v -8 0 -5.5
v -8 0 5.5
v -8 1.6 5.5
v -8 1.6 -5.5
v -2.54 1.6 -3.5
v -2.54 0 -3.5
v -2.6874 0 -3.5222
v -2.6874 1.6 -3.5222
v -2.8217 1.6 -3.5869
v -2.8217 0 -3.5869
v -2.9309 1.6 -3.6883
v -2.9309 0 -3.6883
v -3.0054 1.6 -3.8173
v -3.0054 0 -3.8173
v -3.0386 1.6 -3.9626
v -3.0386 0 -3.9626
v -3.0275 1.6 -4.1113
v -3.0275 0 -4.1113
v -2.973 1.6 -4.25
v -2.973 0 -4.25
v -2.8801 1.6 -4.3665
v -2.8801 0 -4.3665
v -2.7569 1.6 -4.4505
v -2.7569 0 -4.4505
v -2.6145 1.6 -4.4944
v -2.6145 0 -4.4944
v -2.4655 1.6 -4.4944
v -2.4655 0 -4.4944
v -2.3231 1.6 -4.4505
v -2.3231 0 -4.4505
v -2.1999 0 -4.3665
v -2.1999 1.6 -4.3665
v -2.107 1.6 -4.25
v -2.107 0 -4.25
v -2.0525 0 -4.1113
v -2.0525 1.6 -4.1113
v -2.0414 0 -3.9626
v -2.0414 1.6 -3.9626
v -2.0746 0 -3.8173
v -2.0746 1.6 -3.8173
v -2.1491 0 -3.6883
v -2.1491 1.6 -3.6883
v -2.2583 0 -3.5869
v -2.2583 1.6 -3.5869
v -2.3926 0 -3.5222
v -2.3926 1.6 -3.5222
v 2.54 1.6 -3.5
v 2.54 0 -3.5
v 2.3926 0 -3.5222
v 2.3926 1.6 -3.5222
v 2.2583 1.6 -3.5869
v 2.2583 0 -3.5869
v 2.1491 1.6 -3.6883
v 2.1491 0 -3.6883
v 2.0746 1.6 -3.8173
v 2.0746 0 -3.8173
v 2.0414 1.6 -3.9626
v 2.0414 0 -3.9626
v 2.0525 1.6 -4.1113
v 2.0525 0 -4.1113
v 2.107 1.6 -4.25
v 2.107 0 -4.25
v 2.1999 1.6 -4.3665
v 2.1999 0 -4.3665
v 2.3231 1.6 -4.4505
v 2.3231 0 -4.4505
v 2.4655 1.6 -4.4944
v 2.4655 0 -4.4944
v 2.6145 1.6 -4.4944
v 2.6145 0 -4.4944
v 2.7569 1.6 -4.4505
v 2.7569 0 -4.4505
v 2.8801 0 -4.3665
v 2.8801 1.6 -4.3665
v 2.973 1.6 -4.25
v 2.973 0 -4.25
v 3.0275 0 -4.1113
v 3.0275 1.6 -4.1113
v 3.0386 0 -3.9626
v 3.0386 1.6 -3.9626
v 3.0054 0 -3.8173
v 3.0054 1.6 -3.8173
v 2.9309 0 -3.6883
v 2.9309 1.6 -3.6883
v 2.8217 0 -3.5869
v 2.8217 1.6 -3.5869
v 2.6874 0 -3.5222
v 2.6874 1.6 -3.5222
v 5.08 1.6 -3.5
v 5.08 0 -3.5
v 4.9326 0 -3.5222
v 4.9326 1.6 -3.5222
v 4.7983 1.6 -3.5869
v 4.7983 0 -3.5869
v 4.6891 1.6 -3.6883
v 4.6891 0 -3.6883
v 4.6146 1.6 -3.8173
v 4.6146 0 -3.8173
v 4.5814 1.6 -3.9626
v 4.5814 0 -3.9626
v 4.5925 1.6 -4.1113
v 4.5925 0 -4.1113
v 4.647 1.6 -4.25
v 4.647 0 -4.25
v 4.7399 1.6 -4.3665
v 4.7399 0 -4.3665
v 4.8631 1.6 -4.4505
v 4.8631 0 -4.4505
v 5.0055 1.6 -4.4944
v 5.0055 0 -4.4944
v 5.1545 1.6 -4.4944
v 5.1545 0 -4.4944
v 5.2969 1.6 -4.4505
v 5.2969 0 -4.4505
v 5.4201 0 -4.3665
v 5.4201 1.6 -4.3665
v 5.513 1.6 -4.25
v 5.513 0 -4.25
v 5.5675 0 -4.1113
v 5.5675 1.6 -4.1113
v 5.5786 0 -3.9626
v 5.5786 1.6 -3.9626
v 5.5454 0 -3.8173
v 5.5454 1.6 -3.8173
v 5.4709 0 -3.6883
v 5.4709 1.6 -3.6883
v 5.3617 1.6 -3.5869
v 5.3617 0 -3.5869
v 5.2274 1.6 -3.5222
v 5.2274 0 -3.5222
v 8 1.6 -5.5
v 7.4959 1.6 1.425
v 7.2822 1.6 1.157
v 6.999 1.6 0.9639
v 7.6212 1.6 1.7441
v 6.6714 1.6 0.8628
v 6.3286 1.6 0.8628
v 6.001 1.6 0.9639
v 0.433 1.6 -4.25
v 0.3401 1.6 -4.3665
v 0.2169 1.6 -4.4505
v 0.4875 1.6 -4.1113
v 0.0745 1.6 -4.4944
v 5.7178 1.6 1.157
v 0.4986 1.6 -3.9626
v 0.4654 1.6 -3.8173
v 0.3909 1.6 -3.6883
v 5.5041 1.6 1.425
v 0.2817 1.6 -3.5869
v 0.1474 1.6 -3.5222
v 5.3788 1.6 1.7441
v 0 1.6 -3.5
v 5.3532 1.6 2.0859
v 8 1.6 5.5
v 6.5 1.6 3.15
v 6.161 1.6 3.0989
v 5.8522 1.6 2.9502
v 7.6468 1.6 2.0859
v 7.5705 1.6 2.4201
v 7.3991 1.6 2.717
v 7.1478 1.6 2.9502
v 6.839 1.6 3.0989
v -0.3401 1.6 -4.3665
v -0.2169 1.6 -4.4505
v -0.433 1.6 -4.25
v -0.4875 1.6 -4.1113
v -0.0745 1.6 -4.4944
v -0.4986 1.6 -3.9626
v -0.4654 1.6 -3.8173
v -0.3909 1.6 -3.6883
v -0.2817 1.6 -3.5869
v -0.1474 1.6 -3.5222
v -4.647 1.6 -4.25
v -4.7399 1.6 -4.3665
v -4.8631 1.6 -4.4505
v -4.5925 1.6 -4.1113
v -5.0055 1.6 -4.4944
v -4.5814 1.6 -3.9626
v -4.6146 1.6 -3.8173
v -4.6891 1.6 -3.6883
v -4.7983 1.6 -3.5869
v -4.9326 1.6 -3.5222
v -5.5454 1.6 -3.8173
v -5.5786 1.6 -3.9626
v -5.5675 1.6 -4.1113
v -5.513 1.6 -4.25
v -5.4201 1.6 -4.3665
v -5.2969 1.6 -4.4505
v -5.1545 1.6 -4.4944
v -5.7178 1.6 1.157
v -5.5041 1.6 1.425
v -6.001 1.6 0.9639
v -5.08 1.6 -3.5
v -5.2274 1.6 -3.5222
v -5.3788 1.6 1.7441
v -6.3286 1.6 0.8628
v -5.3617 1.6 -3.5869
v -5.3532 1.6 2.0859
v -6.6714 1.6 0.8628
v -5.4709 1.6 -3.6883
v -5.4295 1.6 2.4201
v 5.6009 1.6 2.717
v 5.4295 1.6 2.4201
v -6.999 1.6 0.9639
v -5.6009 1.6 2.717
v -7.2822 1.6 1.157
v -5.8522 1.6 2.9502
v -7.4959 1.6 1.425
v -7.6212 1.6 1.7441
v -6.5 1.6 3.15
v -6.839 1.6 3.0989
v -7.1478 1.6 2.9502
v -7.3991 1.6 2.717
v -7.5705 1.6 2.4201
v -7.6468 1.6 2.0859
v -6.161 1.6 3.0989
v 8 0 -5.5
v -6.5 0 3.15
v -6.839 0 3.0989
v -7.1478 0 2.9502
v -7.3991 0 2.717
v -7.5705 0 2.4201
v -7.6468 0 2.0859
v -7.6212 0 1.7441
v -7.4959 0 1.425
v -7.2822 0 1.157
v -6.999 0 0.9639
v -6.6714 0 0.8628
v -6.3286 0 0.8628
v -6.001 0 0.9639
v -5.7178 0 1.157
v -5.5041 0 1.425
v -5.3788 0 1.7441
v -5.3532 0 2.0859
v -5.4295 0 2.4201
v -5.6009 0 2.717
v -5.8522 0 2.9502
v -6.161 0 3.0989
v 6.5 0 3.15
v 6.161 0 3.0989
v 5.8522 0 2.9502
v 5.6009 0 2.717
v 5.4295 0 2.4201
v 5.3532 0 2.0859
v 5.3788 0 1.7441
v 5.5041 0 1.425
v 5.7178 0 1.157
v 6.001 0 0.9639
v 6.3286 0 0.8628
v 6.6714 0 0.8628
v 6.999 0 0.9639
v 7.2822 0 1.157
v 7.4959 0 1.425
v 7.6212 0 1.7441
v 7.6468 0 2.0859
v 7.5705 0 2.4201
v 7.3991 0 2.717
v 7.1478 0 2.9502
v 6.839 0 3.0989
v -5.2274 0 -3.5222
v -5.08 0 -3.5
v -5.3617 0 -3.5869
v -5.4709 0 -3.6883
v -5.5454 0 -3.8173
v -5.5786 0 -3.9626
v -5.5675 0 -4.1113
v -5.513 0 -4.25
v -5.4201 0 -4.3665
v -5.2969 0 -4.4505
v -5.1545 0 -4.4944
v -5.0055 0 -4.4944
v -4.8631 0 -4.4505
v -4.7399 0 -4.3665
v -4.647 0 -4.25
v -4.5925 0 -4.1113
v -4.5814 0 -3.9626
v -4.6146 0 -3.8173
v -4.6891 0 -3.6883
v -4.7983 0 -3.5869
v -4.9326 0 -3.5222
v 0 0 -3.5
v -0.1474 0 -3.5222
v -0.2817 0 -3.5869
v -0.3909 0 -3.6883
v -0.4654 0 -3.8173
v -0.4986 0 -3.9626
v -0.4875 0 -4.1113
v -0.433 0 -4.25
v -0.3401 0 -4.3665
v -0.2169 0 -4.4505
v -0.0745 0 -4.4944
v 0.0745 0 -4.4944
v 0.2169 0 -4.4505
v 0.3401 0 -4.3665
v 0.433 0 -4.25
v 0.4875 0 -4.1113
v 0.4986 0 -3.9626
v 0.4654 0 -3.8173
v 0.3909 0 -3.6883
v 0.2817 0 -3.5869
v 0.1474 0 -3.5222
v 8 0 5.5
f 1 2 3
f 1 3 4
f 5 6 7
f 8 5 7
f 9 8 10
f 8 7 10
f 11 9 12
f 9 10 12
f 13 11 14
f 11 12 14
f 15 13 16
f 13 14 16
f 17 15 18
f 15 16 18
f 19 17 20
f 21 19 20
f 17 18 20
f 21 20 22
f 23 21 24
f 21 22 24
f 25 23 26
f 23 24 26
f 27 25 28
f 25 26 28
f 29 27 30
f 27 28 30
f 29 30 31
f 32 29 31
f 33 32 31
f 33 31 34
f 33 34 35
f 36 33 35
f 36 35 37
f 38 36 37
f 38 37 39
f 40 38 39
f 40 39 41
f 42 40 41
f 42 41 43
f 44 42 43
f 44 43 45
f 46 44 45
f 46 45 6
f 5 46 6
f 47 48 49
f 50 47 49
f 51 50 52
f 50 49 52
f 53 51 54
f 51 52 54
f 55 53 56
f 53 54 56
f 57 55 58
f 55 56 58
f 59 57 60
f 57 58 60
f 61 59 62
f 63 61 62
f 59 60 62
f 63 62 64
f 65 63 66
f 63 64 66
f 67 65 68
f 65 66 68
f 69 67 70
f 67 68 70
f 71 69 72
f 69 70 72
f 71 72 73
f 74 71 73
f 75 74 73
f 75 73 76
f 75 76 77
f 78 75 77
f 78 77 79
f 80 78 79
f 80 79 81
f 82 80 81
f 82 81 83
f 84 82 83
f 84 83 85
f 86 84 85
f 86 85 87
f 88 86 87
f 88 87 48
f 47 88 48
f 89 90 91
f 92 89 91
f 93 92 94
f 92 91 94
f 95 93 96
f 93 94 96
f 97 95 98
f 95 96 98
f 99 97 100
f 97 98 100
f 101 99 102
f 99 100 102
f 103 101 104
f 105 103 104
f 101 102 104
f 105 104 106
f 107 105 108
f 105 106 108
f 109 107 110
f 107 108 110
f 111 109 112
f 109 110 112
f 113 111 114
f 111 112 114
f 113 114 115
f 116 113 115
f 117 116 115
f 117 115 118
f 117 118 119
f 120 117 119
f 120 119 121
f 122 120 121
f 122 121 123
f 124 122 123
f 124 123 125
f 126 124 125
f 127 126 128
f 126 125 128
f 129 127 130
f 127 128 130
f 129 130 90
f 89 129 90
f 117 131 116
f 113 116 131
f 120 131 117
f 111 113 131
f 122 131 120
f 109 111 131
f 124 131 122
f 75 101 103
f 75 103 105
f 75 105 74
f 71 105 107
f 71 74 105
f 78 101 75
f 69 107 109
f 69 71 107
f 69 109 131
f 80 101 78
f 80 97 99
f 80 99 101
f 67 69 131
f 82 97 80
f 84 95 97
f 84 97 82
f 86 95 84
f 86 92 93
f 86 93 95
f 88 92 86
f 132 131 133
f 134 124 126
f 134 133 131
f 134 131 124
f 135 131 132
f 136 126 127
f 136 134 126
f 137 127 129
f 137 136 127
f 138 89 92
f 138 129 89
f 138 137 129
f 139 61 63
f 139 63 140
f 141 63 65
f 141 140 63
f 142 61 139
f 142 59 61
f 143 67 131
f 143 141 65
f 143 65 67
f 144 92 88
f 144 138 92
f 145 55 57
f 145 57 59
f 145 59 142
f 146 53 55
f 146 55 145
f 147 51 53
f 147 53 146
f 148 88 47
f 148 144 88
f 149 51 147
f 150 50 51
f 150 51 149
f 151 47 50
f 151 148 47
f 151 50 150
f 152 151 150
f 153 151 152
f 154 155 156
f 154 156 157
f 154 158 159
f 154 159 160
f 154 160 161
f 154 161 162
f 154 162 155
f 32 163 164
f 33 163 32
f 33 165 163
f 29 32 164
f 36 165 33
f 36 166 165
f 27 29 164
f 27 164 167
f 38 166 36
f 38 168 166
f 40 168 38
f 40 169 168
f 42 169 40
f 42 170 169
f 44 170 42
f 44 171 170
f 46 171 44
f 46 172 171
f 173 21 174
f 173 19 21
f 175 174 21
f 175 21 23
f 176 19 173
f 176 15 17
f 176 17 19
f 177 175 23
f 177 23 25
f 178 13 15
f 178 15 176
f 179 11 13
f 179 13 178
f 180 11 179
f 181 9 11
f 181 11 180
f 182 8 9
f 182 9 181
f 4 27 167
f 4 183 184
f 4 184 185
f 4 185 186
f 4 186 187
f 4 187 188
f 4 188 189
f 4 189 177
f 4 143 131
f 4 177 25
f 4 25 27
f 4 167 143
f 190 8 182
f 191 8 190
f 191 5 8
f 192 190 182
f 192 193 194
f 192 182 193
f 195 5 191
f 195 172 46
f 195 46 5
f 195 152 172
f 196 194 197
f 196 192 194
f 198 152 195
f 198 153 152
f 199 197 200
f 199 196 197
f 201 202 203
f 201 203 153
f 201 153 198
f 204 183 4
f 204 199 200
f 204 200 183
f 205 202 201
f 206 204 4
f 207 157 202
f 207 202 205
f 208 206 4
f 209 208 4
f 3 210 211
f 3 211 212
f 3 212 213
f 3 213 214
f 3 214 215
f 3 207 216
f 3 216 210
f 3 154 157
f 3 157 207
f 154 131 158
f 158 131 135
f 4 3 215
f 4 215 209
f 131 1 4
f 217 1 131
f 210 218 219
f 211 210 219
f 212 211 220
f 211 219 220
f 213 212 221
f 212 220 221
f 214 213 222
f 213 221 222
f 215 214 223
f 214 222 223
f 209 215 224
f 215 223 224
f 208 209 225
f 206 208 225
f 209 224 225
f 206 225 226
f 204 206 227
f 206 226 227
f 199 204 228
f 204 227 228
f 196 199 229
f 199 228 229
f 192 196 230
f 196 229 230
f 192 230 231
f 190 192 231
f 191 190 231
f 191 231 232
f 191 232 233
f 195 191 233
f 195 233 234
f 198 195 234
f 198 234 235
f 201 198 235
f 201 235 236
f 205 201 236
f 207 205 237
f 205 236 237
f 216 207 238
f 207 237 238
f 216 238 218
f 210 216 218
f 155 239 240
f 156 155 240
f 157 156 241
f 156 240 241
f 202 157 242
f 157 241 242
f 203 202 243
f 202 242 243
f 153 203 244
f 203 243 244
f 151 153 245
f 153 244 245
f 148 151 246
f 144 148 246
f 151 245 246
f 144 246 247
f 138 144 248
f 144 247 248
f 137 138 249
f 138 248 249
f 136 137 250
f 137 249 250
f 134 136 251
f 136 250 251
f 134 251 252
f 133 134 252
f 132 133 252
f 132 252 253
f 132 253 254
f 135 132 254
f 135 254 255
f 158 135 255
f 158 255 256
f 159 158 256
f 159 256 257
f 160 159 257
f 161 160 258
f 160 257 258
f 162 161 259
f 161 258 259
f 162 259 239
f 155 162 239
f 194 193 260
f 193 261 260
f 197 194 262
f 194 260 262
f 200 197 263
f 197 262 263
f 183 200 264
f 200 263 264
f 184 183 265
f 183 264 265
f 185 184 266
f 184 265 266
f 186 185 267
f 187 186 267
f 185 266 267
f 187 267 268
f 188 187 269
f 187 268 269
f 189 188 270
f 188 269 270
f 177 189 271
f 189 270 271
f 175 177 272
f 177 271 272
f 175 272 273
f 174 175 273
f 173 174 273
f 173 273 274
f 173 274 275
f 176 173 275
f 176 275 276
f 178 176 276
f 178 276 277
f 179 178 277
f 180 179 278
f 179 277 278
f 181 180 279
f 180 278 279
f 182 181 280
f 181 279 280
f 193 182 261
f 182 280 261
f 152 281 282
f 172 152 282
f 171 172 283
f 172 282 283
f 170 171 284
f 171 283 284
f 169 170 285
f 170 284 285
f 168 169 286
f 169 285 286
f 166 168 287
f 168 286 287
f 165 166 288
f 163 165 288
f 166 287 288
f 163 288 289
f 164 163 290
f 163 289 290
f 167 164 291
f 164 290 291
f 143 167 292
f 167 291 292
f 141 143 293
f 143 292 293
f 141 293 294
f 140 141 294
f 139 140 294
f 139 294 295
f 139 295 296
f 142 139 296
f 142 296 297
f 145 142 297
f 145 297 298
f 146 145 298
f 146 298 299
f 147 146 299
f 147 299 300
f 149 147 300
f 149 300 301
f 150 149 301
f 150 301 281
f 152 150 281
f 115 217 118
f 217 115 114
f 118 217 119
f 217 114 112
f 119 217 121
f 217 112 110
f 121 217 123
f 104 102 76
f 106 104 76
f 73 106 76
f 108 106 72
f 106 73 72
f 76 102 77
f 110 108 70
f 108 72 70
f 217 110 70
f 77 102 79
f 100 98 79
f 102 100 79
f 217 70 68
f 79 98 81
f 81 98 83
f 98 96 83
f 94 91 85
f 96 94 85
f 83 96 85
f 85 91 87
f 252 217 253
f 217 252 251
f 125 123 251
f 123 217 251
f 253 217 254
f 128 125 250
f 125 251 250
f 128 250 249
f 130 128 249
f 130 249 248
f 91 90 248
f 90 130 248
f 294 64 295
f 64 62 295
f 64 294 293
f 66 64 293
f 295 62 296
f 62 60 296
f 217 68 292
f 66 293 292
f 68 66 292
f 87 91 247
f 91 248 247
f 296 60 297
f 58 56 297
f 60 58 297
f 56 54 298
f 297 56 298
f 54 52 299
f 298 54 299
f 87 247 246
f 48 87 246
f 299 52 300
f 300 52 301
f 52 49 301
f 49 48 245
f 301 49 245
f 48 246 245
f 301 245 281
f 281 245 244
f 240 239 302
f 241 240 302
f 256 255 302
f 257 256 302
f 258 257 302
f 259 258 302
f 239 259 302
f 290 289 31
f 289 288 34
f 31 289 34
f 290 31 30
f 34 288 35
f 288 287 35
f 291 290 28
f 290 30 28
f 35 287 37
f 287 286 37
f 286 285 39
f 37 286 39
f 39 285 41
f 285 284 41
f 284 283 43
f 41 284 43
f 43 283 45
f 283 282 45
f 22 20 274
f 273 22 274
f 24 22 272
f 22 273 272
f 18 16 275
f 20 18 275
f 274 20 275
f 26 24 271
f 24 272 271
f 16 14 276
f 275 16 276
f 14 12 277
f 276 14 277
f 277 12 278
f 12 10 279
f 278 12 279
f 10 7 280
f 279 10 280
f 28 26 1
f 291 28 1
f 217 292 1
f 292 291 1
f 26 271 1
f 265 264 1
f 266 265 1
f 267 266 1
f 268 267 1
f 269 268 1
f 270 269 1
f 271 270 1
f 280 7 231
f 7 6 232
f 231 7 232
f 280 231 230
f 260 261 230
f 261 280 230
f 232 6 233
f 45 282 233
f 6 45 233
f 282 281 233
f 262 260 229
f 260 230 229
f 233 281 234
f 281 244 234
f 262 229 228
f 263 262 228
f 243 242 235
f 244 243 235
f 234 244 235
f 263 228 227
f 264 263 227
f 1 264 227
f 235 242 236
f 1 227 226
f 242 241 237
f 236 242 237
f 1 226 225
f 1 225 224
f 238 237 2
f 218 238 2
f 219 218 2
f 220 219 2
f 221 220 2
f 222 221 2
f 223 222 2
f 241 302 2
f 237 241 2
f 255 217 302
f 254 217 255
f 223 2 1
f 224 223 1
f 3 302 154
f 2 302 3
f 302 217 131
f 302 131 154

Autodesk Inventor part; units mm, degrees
ref_plane "YZ Plane" through (0, 0, 0) normal (1, 0, 0) x (0, 1, 0)
ref_plane "XZ Plane" through (0, 0, 0) normal (0, 1, 0) x (-1, 0, 0)
ref_plane "XY Plane" through (0, 0, 0) normal (0, 0, 1) x (1, 0, 0)
sketch "Sketch1" plane through (0, 0, 0) normal (0, 1, 0) x (-1, 0, 0)
  line L0 (-8, 5.5) -> (8, 5.5)
  line L1 (8, 5.5) -> (8, -5.5)
  line L2 (8, -5.5) -> (-8, -5.5)
  line L3 (-8, -5.5) -> (-8, 5.5)
  line L4 (-8, 5.5) -> (8, -5.5) construction
  line L5 (8, 5.5) -> (-8, -5.5) construction
  point P0 (0, 0)
  dimension "d0" = 16
  dimension "d1" = 11
extrude "Extrusion1" add sketch "Sketch1" along normal blind 1.6
sketch "Sketch2" plane through (0, 1.6, 0) normal (0, 1, 0) x (1, 0, 0)
  line L0 (8, -5.5) -> (8, 5.5) projected
  line L1 (-8, 5.5) -> (-8, -5.5) projected
  line L2 (8, 5.5) -> (-8, 5.5) projected
  point P0 (0, 0)
  point P1 (-6.5, -2)
  point P2 (6.5, -2)
  dimension "d4" = 1.5
  dimension "d5" = 1.5
  dimension "d6" = 7.5
  dimension "d7" = 7.5
hole "Hole1" at (-6.5, 1.6, 2) at (6.5, 1.6, 2) direction (0, -1, 0) diameter 2.3 end through all
sketch "Sketch3" plane through (0, 1.6, 0) normal (0, 1, 0) x (1, 0, 0)
  line L0 (-5.08, 4) -> (5.08, 4) construction
  line L1 (8, 5.5) -> (-8, 5.5) projected
  point P0 (0, 0)
  point P1 (0, 4)
  point P2 (-2.54, 4)
  point P3 (2.54, 4)
  point P4 (0, 4)
  dimension "d15" = 2.54
  dimension "d16" = 2.54
  dimension "d17" = 2.54
  dimension "d18" = 2.54
  dimension "d19" = 0
  dimension "d20" = 1.5
hole "Hole2" at (0, 1.6, -4) at (-2.54, 1.6, -4) at (-5.08, 1.6, -4) at (2.54, 1.6, -4) at (5.08, 1.6, -4) direction (0, -1, 0) diameter 1 end through all
properties part number "USB-C_BASE_plate"
